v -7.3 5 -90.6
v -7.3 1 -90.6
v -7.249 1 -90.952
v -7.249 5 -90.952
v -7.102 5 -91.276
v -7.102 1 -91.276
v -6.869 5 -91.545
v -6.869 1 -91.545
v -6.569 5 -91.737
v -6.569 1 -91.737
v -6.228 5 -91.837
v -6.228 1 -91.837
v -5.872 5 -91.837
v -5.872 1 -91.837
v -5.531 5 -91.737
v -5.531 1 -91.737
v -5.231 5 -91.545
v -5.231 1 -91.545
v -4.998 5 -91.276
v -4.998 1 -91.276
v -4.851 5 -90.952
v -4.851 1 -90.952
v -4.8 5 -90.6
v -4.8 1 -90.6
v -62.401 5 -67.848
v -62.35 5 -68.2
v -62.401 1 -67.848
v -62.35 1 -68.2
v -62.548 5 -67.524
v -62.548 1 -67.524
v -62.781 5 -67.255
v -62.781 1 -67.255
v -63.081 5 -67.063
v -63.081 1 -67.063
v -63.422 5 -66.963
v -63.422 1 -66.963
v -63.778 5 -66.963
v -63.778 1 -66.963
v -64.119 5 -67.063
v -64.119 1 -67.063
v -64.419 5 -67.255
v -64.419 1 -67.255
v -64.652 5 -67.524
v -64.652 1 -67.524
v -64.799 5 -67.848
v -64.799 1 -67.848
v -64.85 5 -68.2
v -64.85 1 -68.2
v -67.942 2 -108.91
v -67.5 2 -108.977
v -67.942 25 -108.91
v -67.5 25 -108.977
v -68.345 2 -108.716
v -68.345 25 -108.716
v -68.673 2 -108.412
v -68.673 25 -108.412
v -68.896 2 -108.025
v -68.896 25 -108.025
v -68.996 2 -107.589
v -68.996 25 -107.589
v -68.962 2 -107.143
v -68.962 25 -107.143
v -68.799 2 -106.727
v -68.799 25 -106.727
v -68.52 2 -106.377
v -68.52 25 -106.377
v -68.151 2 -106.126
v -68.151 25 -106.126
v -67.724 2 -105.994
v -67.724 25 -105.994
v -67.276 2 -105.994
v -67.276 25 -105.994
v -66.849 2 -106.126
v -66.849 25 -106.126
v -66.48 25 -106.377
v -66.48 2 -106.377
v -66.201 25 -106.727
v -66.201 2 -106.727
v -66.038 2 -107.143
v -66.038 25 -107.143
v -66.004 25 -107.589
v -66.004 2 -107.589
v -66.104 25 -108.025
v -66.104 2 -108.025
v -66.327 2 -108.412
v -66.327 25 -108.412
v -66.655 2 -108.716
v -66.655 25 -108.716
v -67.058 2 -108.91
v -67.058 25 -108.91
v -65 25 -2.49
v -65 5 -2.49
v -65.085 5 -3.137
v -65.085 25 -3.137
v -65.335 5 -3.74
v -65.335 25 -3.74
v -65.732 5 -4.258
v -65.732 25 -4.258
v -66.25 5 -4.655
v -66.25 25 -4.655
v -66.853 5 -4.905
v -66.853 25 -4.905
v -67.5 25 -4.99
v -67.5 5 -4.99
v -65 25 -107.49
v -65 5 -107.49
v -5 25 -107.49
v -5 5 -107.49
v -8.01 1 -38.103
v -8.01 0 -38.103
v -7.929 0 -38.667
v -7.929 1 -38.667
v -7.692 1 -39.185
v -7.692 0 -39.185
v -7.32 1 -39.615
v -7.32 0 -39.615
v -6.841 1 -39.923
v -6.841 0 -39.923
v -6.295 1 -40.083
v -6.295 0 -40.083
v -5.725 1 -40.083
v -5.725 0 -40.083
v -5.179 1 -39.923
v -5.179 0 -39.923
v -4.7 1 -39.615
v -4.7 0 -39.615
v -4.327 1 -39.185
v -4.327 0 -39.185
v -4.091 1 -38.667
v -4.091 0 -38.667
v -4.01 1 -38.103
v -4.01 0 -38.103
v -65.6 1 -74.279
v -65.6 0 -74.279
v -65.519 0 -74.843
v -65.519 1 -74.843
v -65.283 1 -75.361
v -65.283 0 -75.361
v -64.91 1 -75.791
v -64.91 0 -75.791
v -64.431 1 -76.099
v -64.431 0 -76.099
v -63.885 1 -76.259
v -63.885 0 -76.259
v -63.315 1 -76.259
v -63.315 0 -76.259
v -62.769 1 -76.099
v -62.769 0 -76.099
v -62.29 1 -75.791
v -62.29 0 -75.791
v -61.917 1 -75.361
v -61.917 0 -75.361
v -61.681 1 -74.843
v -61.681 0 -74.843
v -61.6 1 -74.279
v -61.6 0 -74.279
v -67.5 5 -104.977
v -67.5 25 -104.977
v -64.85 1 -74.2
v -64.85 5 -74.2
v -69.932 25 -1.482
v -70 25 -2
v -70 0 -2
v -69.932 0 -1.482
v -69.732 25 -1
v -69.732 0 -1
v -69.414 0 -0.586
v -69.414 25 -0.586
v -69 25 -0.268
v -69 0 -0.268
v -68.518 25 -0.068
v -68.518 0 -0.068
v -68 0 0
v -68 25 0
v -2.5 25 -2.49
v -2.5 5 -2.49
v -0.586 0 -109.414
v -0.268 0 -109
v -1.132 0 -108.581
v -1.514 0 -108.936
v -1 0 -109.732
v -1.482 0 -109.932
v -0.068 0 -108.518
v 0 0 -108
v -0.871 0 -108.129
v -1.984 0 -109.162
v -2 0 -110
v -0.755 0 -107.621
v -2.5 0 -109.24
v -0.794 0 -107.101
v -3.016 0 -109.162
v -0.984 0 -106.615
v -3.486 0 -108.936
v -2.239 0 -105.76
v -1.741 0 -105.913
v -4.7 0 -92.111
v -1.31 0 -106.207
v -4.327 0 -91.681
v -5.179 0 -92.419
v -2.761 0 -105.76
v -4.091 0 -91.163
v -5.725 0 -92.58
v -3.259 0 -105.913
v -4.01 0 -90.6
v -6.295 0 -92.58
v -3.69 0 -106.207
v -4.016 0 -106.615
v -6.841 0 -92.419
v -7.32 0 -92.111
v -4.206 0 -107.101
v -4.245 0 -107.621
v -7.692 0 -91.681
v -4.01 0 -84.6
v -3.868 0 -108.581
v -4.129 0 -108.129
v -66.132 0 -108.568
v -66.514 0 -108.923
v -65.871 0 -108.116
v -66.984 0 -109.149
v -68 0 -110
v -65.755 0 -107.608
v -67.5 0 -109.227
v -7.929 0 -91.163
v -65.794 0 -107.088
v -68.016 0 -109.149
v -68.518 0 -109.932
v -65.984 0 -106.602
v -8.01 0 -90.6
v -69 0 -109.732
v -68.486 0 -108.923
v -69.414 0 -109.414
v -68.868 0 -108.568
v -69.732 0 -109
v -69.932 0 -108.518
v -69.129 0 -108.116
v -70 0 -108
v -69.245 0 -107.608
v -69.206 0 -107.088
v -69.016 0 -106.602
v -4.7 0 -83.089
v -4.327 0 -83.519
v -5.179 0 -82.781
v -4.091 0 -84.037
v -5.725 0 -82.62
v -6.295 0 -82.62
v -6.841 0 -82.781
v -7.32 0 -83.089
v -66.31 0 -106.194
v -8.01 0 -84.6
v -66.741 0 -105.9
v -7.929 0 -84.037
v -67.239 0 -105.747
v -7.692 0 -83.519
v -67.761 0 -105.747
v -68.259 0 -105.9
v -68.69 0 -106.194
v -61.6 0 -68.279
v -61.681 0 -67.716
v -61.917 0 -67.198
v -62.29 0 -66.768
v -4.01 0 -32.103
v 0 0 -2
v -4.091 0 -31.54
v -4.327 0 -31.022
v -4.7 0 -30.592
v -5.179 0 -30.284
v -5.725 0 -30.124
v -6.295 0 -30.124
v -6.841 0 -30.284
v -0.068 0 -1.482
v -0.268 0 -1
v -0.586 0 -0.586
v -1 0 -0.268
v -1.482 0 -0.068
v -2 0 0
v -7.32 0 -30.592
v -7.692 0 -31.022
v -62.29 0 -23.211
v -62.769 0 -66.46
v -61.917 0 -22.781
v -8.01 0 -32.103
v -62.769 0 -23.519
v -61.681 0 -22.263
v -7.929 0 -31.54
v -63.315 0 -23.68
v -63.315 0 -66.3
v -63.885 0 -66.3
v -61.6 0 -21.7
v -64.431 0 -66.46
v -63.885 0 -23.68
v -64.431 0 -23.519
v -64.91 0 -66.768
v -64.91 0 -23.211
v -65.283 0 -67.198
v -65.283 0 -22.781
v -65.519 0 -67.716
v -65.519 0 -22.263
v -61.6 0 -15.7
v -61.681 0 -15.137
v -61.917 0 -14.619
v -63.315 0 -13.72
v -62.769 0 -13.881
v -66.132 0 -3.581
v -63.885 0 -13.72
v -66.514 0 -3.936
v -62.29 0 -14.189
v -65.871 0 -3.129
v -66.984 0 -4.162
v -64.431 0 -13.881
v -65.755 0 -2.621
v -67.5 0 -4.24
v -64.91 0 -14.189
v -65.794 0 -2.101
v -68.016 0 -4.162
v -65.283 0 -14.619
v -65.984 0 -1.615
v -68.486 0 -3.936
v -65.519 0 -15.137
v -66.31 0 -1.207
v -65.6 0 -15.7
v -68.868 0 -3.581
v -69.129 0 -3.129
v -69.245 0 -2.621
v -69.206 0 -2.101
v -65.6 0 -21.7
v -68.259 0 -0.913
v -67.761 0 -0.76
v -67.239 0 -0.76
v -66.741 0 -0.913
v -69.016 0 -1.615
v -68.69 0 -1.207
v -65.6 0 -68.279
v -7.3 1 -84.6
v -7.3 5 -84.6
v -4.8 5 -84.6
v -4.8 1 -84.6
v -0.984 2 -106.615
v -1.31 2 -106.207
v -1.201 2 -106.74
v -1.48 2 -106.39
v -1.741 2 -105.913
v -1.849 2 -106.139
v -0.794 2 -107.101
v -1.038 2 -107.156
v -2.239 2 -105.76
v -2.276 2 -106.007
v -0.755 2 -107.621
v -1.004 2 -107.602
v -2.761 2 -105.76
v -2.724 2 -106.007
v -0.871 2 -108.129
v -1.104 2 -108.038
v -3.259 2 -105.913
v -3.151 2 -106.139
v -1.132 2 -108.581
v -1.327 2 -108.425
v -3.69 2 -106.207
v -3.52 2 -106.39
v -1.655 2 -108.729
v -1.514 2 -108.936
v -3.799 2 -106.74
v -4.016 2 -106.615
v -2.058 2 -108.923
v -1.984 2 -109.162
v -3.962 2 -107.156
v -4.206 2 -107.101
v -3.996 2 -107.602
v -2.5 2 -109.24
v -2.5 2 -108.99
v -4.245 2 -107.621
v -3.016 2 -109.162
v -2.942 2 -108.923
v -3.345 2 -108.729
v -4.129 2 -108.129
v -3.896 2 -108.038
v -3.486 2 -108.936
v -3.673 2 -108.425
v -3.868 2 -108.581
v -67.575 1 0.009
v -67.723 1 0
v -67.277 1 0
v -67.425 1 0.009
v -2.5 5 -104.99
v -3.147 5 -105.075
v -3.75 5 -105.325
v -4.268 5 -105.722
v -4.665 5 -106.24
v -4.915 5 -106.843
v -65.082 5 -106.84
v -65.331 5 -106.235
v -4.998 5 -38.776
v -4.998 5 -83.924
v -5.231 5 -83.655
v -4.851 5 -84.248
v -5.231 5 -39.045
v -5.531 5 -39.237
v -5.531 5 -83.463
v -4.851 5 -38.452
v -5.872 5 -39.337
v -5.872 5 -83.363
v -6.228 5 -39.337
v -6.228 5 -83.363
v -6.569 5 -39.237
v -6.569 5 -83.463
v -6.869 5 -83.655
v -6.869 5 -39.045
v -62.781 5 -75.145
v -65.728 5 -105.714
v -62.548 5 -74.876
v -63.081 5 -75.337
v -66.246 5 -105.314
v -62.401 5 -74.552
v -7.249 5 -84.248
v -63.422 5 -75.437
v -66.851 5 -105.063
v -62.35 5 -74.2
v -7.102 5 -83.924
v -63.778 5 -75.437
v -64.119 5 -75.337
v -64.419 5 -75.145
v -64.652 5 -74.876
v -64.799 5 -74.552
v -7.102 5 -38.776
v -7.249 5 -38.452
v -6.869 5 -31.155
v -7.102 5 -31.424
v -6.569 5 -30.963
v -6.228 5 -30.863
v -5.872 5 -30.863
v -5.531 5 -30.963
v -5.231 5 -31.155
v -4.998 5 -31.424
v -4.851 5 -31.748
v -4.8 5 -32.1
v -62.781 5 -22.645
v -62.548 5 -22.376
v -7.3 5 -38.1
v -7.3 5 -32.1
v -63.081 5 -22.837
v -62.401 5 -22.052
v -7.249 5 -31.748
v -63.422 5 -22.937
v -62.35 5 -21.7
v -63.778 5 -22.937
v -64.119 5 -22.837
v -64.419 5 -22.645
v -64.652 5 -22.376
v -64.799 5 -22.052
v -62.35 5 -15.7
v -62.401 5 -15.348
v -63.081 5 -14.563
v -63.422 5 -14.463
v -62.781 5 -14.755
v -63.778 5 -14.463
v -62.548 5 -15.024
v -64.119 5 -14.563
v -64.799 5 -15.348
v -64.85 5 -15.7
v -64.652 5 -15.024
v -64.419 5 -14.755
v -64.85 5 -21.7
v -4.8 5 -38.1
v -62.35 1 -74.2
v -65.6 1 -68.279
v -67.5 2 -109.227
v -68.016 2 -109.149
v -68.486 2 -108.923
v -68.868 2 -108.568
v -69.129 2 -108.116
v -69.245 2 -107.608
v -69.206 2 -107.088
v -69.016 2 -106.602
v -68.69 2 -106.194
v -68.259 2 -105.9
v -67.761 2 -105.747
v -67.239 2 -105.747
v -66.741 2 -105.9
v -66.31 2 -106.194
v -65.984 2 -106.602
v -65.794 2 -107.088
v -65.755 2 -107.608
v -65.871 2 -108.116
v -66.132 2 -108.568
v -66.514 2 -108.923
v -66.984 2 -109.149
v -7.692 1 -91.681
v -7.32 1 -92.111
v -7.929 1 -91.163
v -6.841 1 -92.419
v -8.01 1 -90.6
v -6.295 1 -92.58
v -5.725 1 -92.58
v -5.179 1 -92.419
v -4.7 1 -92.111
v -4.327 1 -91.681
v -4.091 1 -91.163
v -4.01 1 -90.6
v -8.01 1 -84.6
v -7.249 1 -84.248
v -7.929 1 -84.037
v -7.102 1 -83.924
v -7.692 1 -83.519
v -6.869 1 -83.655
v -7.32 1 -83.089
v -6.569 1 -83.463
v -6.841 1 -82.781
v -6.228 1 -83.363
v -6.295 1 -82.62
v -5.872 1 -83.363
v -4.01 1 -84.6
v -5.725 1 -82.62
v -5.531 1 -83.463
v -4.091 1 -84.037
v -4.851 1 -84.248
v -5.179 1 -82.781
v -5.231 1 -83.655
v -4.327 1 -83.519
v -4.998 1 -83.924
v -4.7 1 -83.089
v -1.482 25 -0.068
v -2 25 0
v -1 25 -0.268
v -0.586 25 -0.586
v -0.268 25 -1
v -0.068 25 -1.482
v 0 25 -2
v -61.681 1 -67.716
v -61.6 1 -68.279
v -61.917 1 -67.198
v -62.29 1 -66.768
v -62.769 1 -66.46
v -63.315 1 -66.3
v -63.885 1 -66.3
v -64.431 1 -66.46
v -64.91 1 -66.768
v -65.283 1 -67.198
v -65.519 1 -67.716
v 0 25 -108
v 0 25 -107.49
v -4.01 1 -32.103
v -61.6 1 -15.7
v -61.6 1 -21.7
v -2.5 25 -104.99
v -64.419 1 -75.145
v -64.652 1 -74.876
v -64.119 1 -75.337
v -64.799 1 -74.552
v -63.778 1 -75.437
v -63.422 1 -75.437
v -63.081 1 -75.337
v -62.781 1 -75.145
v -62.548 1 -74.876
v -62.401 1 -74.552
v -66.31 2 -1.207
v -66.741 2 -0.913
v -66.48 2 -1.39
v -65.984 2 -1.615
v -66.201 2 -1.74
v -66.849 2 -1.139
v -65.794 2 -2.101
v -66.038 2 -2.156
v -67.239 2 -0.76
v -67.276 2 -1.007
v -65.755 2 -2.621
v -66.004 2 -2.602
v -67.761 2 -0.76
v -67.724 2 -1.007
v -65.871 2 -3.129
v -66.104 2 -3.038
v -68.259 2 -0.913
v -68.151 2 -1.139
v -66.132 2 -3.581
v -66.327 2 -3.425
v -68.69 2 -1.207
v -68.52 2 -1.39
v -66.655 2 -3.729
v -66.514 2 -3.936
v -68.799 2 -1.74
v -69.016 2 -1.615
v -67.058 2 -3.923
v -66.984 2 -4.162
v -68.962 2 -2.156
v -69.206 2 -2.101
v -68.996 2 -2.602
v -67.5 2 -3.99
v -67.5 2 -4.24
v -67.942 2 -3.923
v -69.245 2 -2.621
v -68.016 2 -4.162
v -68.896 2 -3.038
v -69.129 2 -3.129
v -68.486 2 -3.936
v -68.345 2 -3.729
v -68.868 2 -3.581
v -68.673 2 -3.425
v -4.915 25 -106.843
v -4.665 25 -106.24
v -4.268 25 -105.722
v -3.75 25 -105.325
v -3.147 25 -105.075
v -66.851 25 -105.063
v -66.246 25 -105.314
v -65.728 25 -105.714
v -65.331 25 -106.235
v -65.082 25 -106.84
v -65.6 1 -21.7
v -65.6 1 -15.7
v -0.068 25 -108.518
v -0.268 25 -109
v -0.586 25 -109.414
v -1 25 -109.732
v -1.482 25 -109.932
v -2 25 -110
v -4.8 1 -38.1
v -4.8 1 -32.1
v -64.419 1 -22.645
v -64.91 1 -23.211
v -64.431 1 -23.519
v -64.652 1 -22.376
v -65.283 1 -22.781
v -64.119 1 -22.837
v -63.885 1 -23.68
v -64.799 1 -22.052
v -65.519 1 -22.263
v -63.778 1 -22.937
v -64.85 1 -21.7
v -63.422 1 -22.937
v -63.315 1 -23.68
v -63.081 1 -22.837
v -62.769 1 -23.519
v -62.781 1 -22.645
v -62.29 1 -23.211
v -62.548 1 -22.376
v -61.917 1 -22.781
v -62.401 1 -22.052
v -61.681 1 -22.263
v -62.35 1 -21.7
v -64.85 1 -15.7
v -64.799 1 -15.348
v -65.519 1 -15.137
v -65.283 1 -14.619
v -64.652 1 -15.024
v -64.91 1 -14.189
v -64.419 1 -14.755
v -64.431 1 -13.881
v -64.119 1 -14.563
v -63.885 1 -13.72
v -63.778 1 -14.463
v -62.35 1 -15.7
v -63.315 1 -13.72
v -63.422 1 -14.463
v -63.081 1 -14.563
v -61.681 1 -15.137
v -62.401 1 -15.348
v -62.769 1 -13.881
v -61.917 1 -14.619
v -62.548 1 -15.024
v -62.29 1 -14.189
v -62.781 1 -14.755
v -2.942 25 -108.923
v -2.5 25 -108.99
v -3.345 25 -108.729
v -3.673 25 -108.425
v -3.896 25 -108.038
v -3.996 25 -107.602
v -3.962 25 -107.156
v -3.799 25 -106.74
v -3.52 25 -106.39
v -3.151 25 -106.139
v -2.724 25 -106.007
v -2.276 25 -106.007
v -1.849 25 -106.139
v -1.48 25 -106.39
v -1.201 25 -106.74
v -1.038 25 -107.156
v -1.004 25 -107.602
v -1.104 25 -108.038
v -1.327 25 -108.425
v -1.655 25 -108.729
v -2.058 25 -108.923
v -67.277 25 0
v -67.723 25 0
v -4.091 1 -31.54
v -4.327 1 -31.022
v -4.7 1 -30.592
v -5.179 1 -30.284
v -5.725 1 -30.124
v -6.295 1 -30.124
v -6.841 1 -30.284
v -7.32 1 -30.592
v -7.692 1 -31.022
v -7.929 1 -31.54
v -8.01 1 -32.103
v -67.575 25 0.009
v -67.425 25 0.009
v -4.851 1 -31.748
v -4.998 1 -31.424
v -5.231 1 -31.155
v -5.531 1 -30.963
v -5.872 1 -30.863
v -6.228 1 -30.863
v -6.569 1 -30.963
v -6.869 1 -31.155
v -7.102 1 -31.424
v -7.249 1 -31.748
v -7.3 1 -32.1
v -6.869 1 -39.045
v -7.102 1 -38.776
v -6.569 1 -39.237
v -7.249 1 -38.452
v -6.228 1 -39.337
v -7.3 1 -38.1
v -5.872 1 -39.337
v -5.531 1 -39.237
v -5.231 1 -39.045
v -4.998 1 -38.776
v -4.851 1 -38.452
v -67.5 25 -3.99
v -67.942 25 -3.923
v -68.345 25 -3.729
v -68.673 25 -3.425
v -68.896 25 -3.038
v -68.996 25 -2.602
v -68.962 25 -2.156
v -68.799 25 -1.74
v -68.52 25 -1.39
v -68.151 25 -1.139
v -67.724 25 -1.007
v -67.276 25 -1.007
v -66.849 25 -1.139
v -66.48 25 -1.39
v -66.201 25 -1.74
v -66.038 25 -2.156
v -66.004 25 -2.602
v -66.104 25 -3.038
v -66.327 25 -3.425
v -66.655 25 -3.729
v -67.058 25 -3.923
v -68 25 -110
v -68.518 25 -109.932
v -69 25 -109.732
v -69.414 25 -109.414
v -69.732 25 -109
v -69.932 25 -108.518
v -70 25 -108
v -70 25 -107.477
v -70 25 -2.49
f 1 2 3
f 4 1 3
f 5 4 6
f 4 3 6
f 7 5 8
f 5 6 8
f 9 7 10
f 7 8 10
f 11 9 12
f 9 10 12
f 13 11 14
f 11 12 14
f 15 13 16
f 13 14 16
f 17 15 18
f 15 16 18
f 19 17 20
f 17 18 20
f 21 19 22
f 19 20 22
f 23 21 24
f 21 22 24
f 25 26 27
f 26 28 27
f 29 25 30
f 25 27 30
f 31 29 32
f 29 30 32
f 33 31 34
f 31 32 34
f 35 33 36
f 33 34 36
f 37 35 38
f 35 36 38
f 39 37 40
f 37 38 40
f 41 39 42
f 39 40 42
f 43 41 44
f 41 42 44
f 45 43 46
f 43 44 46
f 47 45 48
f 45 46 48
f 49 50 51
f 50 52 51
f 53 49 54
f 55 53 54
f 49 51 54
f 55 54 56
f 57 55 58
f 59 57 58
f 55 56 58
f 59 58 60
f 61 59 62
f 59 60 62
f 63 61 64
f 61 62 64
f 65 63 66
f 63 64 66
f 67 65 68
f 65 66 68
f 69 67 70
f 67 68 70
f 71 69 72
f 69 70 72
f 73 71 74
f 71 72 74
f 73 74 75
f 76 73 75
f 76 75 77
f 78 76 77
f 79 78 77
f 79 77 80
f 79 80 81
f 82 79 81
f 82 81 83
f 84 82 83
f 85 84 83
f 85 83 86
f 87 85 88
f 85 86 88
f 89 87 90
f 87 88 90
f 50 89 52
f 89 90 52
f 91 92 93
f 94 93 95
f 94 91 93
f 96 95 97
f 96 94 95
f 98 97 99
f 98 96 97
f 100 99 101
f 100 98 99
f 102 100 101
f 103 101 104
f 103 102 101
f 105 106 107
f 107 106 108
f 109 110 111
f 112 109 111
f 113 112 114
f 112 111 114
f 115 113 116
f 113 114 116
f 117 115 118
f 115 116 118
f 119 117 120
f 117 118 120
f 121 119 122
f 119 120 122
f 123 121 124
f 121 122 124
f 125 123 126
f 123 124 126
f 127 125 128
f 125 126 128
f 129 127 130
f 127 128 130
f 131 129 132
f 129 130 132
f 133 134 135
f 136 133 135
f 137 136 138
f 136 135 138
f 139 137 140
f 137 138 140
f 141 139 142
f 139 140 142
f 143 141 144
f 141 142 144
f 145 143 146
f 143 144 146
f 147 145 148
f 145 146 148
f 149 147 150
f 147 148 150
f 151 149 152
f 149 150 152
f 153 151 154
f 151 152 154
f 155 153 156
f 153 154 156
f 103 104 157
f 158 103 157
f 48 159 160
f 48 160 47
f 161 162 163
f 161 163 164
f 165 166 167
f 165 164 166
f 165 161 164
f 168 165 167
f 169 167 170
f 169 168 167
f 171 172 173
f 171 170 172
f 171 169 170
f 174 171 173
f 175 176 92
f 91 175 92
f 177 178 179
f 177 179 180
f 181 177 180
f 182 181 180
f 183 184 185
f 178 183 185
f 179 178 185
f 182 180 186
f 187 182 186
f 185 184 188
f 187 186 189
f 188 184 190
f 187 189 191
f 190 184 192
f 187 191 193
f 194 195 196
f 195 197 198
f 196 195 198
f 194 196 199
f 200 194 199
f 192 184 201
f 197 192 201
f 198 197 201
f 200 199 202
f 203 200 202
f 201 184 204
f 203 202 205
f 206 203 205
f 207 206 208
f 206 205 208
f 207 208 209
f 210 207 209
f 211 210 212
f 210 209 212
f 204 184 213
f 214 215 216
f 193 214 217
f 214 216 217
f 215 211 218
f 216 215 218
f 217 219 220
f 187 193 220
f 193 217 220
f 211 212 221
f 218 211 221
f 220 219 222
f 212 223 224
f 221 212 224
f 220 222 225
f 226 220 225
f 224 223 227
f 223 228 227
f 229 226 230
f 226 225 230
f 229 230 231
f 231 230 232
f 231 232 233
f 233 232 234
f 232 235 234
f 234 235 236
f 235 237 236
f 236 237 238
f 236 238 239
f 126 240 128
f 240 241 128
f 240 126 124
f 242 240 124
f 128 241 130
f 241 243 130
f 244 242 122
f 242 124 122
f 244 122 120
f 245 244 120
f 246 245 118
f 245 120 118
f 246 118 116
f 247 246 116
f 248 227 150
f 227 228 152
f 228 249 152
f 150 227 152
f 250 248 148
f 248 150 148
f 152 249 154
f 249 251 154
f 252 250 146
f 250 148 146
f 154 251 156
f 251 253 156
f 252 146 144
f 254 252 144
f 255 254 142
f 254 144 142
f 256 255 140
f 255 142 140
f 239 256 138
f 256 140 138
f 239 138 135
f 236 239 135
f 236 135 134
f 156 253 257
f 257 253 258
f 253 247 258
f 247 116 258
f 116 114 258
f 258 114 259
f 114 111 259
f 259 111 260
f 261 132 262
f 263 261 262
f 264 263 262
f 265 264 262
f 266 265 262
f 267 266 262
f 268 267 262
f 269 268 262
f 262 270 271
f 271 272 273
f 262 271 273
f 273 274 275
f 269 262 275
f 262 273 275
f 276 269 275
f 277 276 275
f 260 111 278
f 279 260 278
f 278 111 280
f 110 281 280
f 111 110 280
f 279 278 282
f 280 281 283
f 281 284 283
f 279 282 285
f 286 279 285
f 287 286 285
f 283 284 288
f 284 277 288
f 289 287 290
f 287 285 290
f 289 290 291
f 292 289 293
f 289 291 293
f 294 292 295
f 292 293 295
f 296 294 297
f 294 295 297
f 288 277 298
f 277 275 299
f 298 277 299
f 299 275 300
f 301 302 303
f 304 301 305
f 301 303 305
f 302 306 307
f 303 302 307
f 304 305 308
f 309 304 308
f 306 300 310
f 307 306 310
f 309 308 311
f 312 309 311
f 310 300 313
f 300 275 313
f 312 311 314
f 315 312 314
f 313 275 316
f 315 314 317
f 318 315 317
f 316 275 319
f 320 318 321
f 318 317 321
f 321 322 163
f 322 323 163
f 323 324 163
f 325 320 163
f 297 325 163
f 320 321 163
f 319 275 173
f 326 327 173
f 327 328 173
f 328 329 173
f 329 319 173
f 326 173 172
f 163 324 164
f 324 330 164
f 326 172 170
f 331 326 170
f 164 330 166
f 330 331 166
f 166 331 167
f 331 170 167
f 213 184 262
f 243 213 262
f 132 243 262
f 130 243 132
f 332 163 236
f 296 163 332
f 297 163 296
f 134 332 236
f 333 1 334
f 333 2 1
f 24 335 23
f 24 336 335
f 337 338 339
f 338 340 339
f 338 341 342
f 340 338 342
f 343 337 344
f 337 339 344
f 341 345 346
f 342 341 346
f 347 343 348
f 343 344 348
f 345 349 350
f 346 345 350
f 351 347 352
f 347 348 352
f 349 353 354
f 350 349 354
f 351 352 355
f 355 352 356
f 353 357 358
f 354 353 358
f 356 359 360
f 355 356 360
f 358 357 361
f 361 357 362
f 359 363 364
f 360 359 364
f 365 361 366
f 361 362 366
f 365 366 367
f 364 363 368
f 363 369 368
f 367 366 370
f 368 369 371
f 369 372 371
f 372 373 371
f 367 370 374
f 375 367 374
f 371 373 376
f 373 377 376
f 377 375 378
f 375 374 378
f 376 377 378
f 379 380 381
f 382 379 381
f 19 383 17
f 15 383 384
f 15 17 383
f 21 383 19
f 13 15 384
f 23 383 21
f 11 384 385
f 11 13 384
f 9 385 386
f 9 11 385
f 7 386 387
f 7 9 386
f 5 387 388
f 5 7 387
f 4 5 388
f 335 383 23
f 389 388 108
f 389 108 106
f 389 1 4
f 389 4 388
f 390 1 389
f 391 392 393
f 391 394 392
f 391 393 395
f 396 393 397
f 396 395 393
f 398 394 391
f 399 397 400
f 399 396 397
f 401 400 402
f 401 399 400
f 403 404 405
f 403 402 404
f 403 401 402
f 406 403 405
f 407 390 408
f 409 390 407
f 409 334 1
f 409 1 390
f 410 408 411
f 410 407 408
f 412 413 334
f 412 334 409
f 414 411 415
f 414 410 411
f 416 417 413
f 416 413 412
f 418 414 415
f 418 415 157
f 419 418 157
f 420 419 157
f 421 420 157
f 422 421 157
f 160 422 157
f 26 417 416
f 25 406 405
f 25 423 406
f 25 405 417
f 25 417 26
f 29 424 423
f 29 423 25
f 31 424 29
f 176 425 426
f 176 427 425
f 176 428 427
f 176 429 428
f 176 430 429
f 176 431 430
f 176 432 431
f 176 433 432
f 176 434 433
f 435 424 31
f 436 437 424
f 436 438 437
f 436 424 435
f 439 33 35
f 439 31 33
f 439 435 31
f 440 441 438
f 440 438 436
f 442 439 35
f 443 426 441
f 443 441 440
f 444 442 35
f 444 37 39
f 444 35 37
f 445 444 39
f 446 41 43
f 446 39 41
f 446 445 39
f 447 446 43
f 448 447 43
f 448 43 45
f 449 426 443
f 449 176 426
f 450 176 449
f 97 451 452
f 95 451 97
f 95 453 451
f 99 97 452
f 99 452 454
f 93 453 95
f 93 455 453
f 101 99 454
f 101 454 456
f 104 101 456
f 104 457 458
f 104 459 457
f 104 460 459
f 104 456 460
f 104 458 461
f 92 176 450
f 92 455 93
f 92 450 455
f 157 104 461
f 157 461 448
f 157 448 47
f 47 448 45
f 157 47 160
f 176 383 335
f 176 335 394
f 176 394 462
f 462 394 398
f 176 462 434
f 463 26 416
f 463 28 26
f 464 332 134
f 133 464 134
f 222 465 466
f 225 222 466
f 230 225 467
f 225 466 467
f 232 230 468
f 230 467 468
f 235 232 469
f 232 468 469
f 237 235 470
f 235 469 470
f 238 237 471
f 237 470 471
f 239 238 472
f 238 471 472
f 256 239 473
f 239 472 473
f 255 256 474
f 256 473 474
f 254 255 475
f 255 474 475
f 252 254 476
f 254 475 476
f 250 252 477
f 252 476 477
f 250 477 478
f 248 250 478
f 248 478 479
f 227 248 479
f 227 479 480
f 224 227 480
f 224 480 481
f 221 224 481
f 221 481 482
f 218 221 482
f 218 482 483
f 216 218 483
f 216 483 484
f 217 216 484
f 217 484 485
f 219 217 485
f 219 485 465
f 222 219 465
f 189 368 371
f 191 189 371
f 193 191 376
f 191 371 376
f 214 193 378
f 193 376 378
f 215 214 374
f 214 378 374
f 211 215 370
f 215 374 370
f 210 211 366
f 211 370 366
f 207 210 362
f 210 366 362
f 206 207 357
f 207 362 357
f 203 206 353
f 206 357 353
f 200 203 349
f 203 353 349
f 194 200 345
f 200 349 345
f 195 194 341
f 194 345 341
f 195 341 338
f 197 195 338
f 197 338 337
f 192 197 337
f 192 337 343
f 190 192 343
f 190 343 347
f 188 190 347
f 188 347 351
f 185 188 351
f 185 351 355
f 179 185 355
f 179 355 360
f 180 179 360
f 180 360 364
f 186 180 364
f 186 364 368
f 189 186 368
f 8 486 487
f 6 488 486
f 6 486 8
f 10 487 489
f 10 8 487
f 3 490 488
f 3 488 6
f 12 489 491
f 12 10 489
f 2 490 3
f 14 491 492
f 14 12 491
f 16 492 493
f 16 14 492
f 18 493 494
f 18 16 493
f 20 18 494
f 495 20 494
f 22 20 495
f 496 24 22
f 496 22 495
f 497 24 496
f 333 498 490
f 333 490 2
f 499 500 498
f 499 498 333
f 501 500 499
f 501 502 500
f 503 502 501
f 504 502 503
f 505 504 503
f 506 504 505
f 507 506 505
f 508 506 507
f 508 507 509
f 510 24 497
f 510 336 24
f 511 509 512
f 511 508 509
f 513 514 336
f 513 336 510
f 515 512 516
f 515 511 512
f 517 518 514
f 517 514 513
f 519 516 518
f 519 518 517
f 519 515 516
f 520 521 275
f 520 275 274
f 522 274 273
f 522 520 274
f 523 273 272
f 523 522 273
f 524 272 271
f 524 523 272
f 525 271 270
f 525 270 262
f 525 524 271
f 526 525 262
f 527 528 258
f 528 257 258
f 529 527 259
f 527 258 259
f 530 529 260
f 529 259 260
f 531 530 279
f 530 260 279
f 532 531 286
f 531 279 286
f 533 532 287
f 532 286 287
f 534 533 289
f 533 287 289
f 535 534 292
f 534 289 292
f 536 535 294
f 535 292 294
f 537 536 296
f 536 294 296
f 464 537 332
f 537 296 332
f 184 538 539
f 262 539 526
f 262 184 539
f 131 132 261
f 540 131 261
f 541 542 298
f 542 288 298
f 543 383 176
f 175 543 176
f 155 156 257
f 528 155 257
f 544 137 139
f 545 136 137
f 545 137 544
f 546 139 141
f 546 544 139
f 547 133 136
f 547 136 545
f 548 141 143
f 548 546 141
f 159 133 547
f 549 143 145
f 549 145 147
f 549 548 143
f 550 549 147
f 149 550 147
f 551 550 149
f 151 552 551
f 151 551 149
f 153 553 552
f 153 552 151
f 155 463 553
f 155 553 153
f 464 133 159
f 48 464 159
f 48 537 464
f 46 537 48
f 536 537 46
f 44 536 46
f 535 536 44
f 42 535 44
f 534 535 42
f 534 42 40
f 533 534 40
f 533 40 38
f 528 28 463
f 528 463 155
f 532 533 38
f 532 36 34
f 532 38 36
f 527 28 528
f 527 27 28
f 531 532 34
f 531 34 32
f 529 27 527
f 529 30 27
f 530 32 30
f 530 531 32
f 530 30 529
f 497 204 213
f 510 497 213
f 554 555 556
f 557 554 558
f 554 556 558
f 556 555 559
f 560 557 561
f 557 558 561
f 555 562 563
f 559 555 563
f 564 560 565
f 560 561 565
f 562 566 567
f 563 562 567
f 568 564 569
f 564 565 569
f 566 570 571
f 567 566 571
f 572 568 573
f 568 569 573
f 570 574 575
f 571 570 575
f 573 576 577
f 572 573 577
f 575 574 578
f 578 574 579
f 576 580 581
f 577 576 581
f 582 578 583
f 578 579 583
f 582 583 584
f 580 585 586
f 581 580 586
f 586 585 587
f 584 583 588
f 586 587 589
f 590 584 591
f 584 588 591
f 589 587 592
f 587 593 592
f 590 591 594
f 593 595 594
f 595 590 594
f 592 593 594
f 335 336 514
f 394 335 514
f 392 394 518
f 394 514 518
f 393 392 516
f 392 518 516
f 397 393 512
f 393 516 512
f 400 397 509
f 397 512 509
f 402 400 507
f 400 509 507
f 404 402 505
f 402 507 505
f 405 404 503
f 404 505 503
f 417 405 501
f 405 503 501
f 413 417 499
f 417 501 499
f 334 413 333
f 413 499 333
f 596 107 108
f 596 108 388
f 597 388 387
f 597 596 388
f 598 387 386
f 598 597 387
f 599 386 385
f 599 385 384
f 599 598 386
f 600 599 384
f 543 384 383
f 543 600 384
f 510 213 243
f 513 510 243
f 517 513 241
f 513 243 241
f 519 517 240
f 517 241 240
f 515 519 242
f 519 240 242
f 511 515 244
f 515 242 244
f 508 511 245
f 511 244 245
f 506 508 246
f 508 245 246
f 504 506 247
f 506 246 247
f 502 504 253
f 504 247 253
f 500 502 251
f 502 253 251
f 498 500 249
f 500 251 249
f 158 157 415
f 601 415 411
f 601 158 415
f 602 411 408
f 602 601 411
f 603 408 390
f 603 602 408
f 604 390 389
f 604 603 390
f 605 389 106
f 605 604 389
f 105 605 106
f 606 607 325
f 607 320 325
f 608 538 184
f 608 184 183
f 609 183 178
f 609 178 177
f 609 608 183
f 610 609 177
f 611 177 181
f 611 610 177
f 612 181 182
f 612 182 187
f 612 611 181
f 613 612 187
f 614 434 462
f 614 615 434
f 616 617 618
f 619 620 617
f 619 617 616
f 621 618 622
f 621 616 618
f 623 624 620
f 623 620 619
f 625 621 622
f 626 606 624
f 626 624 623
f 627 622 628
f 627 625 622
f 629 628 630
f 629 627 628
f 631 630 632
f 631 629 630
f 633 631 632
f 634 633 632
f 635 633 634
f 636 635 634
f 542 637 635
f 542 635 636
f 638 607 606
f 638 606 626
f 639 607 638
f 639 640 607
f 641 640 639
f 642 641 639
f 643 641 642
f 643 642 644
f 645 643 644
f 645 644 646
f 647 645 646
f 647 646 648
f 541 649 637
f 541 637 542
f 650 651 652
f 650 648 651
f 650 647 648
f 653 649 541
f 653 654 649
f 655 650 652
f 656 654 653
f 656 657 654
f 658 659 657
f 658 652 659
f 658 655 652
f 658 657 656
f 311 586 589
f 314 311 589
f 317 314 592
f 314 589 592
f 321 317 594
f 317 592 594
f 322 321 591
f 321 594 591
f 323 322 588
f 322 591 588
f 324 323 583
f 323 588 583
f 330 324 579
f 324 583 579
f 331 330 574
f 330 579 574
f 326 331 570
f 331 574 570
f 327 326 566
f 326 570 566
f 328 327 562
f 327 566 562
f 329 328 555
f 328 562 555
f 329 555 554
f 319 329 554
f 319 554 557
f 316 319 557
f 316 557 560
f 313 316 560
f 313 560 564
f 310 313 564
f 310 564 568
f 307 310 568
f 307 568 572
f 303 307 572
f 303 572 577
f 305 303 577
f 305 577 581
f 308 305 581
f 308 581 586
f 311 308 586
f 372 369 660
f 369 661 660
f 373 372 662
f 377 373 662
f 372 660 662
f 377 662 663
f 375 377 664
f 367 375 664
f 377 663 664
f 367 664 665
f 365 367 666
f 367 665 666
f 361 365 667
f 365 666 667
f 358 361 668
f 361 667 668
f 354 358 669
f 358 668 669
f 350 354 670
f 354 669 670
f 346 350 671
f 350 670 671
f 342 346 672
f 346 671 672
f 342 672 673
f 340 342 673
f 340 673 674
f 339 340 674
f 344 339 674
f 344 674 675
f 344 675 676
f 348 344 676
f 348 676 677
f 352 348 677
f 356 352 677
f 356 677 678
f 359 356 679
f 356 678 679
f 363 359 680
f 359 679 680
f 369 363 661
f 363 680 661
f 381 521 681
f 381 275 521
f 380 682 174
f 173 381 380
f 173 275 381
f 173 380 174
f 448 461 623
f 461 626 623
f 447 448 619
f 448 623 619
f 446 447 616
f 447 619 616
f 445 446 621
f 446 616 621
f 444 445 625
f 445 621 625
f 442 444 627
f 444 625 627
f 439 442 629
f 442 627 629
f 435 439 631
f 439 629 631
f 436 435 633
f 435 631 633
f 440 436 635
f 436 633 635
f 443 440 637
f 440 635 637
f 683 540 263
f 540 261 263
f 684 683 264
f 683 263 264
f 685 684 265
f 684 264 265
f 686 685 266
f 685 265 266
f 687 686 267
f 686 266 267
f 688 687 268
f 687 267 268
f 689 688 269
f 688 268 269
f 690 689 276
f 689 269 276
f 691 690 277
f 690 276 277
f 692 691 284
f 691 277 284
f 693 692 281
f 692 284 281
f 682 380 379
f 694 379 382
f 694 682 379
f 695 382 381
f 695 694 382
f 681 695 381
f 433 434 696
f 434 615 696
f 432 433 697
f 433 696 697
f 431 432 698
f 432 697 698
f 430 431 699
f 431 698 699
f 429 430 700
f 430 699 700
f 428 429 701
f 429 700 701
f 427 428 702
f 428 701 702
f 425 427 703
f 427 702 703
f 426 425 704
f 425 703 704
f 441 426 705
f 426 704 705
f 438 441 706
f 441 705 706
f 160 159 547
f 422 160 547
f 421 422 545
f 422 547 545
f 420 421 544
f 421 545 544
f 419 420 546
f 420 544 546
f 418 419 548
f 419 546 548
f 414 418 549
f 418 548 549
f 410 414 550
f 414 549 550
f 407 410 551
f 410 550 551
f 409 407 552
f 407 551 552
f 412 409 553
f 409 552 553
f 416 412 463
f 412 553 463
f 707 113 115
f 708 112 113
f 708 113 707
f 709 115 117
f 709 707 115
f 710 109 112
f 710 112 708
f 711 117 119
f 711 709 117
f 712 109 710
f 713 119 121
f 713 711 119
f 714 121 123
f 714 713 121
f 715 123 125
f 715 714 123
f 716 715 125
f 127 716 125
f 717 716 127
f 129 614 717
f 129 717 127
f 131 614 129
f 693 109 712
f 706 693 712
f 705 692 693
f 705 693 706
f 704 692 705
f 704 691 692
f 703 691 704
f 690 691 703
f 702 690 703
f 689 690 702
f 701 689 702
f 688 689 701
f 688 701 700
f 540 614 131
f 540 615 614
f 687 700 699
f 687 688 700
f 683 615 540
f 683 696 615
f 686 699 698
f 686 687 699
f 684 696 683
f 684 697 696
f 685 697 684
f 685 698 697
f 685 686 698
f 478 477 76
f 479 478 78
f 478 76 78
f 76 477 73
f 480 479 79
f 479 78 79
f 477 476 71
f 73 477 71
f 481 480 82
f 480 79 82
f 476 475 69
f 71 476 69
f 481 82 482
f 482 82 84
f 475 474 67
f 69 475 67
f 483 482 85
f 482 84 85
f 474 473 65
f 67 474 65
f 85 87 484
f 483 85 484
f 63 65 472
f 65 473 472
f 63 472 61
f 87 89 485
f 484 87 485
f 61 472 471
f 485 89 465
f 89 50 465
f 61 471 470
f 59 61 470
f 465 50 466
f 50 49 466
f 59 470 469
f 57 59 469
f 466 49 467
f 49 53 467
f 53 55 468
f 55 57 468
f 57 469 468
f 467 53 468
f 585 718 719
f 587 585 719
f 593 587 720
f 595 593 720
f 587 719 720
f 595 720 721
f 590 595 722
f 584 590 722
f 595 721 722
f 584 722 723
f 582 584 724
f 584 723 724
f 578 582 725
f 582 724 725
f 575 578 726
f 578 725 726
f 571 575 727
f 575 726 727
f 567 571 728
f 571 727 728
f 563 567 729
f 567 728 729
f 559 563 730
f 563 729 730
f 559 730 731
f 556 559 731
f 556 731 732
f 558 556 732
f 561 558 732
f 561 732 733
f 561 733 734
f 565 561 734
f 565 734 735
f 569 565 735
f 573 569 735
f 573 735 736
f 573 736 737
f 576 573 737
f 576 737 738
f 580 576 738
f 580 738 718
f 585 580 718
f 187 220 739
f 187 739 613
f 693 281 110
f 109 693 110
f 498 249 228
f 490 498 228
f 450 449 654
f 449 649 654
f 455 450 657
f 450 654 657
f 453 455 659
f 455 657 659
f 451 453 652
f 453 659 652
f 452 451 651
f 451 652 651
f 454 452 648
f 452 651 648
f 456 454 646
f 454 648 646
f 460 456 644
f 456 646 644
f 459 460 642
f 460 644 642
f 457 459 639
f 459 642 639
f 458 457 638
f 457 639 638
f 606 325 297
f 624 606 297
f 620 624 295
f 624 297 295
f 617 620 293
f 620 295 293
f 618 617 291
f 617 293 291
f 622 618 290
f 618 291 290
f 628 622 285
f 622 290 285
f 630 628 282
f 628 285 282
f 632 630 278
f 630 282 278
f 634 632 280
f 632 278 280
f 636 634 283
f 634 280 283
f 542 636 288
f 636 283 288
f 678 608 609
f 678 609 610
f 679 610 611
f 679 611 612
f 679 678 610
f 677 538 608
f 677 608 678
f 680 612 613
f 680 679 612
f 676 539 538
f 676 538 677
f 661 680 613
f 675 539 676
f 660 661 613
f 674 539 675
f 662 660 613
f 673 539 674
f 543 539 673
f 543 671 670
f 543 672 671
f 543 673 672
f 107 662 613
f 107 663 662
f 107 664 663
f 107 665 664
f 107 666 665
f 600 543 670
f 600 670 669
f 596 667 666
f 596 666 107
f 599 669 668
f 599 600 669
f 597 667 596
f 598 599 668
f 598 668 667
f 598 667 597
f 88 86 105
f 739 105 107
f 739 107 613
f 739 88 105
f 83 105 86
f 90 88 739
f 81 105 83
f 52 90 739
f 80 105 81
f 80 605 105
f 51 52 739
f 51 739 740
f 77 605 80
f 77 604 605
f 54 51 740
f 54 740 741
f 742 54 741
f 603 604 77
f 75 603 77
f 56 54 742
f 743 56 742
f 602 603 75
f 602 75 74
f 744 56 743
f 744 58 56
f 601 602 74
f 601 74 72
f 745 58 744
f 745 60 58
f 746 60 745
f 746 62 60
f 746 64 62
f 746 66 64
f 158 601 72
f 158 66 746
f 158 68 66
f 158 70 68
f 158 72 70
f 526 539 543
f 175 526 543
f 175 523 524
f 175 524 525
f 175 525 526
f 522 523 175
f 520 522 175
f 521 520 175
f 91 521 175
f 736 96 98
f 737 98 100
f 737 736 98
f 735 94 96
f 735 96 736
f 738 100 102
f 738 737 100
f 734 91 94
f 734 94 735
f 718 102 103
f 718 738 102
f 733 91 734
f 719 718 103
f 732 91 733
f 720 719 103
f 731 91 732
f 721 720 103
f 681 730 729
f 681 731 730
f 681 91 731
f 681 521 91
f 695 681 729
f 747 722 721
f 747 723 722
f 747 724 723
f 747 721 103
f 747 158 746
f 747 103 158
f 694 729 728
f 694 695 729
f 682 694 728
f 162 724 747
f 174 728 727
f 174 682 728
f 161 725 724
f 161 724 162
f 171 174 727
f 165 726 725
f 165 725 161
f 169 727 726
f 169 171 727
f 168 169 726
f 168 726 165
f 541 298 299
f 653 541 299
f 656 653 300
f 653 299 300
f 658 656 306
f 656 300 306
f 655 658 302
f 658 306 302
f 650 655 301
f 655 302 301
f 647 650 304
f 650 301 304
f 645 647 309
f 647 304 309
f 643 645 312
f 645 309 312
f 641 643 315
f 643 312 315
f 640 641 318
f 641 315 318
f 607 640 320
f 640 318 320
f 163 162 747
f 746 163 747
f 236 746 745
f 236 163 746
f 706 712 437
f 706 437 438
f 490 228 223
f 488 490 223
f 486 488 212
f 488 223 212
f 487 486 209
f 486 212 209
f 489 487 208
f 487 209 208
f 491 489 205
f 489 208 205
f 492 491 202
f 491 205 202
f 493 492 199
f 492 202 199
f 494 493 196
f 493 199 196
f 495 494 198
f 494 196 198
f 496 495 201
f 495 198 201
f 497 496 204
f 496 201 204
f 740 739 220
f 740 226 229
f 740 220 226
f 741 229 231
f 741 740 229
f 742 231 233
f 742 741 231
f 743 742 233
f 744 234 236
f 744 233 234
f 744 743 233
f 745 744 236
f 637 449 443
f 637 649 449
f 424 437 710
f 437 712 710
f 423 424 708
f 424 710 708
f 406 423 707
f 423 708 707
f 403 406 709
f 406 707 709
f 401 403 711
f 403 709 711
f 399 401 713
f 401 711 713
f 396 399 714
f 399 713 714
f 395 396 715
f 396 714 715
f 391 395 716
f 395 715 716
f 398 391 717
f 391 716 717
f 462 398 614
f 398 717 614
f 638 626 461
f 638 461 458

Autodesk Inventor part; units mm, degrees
ref_plane "YZ Plane" through (0, 0, 0) normal (1, 0, 0) x (0, 1, 0)
ref_plane "XZ Plane" through (0, 0, 0) normal (0, 1, 0) x (-1, 0, 0)
ref_plane "XY Plane" through (0, 0, 0) normal (0, 0, 1) x (1, 0, 0)
sketch "Sketch1" plane through (0, 0, 0) normal (0, 1, 0) x (-1, 0, 0)
  line L0 (0, 0) -> (70, 0)
  line L1 (70, 0) -> (70, -110)
  line L2 (70, -110) -> (0, -110)
  line L3 (0, -110) -> (0, 0)
  line L4 (2.5, -2.49) -> (67.5, -2.49)
  line L5 (67.5, -2.49) -> (67.5, -107.49)
  line L6 (67.5, -107.49) -> (2.5, -107.49)
  line L7 (2.5, -107.49) -> (2.5, -2.49)
  line L8 (67.5, -54.99) -> (2.5, -54.99) construction
  line L9 (67.5, -54.99) -> (63.6, -54.99) construction
  line L10 (63.6, -54.99) -> (63.6, -71.2) construction
  line L11 (63.6, -71.2) -> (67.5, -71.2) construction
  line L12 (67.5, -71.2) -> (67.5, -54.99) construction
  line L13 (63.6, -68.2) -> (63.6, -74.2) construction
  line L14 (62.35, -68.2) -> (62.35, -74.2)
  line L15 (64.85, -74.2) -> (64.85, -68.2)
  arc A0 (64.85, -68.2) -> (62.35, -68.2) centre (63.6, -68.2) ccw
  arc A1 (62.35, -74.2) -> (64.85, -74.2) centre (63.6, -74.2) ccw
  line L16 (63.6, -71.2) -> (63.6, -87.6) construction
  line L17 (2.5, -87.6) -> (6.05, -87.6) construction
  line L18 (6.05, -84.6) -> (6.05, -90.6) construction
  line L19 (4.8, -84.6) -> (4.8, -90.6)
  line L20 (7.3, -90.6) -> (7.3, -84.6)
  arc A2 (7.3, -84.6) -> (4.8, -84.6) centre (6.05, -84.6) ccw
  arc A3 (4.8, -90.6) -> (7.3, -90.6) centre (6.05, -90.6) ccw
  line L21 (67.5, -2.49) -> (63.6, -2.49) construction
  line L22 (63.6, -2.49) -> (63.6, -18.7) construction
  line L23 (63.6, -18.7) -> (67.5, -18.7) construction
  line L24 (67.5, -18.7) -> (67.5, -2.49) construction
  line L25 (63.6, -18.7) -> (63.6, -35.1) construction
  line L26 (2.5, -35.1) -> (6.05, -35.1) construction
  line L27 (63.6, -15.7) -> (63.6, -21.7) construction
  line L28 (62.35, -15.7) -> (62.35, -21.7)
  line L29 (64.85, -21.7) -> (64.85, -15.7)
  arc A4 (64.85, -15.7) -> (62.35, -15.7) centre (63.6, -15.7) ccw
  arc A5 (62.35, -21.7) -> (64.85, -21.7) centre (63.6, -21.7) ccw
  line L30 (6.05, -32.1) -> (6.05, -38.1) construction
  line L31 (4.8, -32.1) -> (4.8, -38.1)
  line L32 (7.3, -38.1) -> (7.3, -32.1)
  arc A6 (7.3, -32.1) -> (4.8, -32.1) centre (6.05, -32.1) ccw
  arc A7 (4.8, -38.1) -> (7.3, -38.1) centre (6.05, -38.1) ccw
  point P0 (35, -55)
  dimension "d0" = 70
  dimension "d1" = 110
  dimension "d2" = 65
  dimension "d3" = 105
  dimension "d4" = 52.5
  dimension "d5" = 52.5
  dimension "d6" = 3.9
  dimension "d7" = 16.21
  dimension "d8" = 3
  dimension "d9" = 2.5
  dimension "d10" = 16.4
  dimension "d11" = 3.55
  dimension "d12" = 3
  dimension "d13" = 2.5
  dimension "d14" = 19.89
  dimension "d15" = 16.4
  dimension "d16" = 3.9
  dimension "d17" = 16.21
  dimension "d18" = 16.4
  dimension "d19" = 3.55
  dimension "d20" = 3
  dimension "d21" = 2.5
  dimension "d22" = 3
  dimension "d23" = 2.5
extrude "Extrusion1" add sketch "Sketch1" along normal blind 25 contours L0 L1 L2 L3
extrude "Extrusion2" add sketch "Sketch1" along normal blind 5 contours L4 L5 L6 L7
sketch "Sketch2" plane through (0, 0, 0) normal (0, -1, 0) x (1, 0, 0)
  line L0 (-63.6, -21.7) -> (-63.6, -15.7) construction
  line L1 (-61.6, -21.7) -> (-61.6, -15.7)
  line L2 (-65.6, -15.7) -> (-65.6, -21.7)
  arc A0 (-65.6, -21.7) -> (-61.6, -21.7) centre (-63.6, -21.7) ccw
  arc A1 (-61.6, -15.7) -> (-65.6, -15.7) centre (-63.6, -15.7) ccw
  line L3 (-6.0099, -38.1033) -> (-6.0099, -32.1033) construction
  line L4 (-4.0099, -38.1033) -> (-4.0099, -32.1033)
  line L5 (-8.0099, -32.1033) -> (-8.0099, -38.1033)
  arc A2 (-8.0099, -38.1033) -> (-4.0099, -38.1033) centre (-6.0099, -38.1033) ccw
  arc A3 (-4.0099, -32.1033) -> (-8.0099, -32.1033) centre (-6.0099, -32.1033) ccw
  line L6 (-63.6, -74.2793) -> (-63.6, -68.2793) construction
  line L7 (-61.6, -74.2793) -> (-61.6, -68.2793)
  line L8 (-65.6, -68.2793) -> (-65.6, -74.2793)
  arc A4 (-65.6, -74.2793) -> (-61.6, -74.2793) centre (-63.6, -74.2793) ccw
  arc A5 (-61.6, -68.2793) -> (-65.6, -68.2793) centre (-63.6, -68.2793) ccw
  line L9 (-6.0099, -90.6) -> (-6.0099, -84.6) construction
  line L10 (-4.8, -90.6) -> (-4.8, -84.6) projected
  line L11 (-4.0099, -90.6) -> (-4.0099, -84.6)
  line L12 (-8.0099, -84.6) -> (-8.0099, -90.6)
  arc A6 (-8.0099, -90.6) -> (-4.0099, -90.6) centre (-6.0099, -90.6) ccw
  arc A7 (-4.0099, -84.6) -> (-8.0099, -84.6) centre (-6.0099, -84.6) ccw
  line L13 (-6.0099, -87.6) -> (-0.0099, -87.6) construction
  point P0 (0, 0)
  point P1 (-63.6, -18.7)
  point P2 (-6.0099, -35.1033)
  point P3 (-63.6, -71.2793)
  dimension "d28" = 3
  dimension "d29" = 4
  dimension "d30" = 3
  dimension "d31" = 4
  dimension "d32" = 3
  dimension "d33" = 4
  dimension "d34" = 3
  dimension "d35" = 90
  dimension "d36" = 4
extrude "Extrusion3" cut sketch "Sketch2" against normal blind 1
sketch "Sketch3" plane through (0, 25, 0) normal (0, 1, 0) x (1, 0, 0)
  line L0 (-67.5, 2.49) -> (-67.5, 107.49) projected
  circle A0 centre (-67.5, 2.49) radius 2.5
  line L1 (-70, 2) -> (-70, 108) projected
  circle A1 centre (-67.5, 107.477) radius 2.5
  line L2 (-67.5, 107.49) -> (-2.5, 107.49) projected
  circle A2 centre (-2.5, 107.49) radius 2.5
  point P0 (0, 0)
  dimension "d40" = 5
extrude "Extrusion4" add sketch "Sketch3" against normal blind 24 contours A2 | A0 | A1 L2 L0 | L0 L2 A1
sketch "Sketch5" plane through (0, 0, 0) normal (0, -1, 0) x (1, 0, 0)
  arc A0 (-2.5, -104.99) -> (-5, -107.49) centre (-2.5, -107.49) ccw projected
  arc A1 (-65, -107.49) -> (-67.5, -104.977) centre (-67.5, -107.477) ccw projected
  arc A2 (-67.5, -4.99) -> (-65, -2.49) centre (-67.5, -2.49) ccw projected
  point P0 (0, 0)
hole "Hole1" at (-2.5, 0, -107.49) at (-67.5, 0, -107.477) at (-67.5, 0, -2.49) direction (0, 1, 0) diameter 3 depth 40 tip angle 118 counterbore diameter 3.5 counterbore depth 2
fillet "Fillet2" radius 2 4 edges at (-70, 12.5, 0) (-70, 12.5, -110) (0, 12.5, -110) (0, 12.5, 0)
sketch "Sketch6" plane through (0, 0, 0) normal (0, -1, 0) x (1, 0, 0)
  line L0 (-19.0093, -31.0437) -> (-19.0093, -43.6077) construction
  line L1 (-19.0093, -43.6077) -> (-93.3266, -43.6077) construction
  line L2 (-93.3266, -43.6077) -> (-93.3266, -31.0437) construction
  line L3 (-93.3266, -31.0437) -> (-19.0093, -31.0437) construction
  line L4 (-32.1283, -26.5619) -> (-32.1283, -53.8239) construction
  line L5 (-32.1283, -53.8239) -> (-124.1375, -53.8239) construction
  line L6 (-124.1375, -53.8239) -> (-124.1375, -26.5619) construction
  line L7 (-124.1375, -26.5619) -> (-32.1283, -26.5619) construction
  line L8 (-45.7196, -50.7865) -> (-45.7196, -85.058) construction
  line L9 (-45.7196, -85.058) -> (-48.896, -85.058) construction
  line L10 (-48.896, -85.058) -> (-48.896, -50.7865) construction
  line L11 (-48.896, -50.7865) -> (-45.7196, -50.7865) construction
  point P0 (0, 0)
properties part number "SUPERIOR MODEL2"
